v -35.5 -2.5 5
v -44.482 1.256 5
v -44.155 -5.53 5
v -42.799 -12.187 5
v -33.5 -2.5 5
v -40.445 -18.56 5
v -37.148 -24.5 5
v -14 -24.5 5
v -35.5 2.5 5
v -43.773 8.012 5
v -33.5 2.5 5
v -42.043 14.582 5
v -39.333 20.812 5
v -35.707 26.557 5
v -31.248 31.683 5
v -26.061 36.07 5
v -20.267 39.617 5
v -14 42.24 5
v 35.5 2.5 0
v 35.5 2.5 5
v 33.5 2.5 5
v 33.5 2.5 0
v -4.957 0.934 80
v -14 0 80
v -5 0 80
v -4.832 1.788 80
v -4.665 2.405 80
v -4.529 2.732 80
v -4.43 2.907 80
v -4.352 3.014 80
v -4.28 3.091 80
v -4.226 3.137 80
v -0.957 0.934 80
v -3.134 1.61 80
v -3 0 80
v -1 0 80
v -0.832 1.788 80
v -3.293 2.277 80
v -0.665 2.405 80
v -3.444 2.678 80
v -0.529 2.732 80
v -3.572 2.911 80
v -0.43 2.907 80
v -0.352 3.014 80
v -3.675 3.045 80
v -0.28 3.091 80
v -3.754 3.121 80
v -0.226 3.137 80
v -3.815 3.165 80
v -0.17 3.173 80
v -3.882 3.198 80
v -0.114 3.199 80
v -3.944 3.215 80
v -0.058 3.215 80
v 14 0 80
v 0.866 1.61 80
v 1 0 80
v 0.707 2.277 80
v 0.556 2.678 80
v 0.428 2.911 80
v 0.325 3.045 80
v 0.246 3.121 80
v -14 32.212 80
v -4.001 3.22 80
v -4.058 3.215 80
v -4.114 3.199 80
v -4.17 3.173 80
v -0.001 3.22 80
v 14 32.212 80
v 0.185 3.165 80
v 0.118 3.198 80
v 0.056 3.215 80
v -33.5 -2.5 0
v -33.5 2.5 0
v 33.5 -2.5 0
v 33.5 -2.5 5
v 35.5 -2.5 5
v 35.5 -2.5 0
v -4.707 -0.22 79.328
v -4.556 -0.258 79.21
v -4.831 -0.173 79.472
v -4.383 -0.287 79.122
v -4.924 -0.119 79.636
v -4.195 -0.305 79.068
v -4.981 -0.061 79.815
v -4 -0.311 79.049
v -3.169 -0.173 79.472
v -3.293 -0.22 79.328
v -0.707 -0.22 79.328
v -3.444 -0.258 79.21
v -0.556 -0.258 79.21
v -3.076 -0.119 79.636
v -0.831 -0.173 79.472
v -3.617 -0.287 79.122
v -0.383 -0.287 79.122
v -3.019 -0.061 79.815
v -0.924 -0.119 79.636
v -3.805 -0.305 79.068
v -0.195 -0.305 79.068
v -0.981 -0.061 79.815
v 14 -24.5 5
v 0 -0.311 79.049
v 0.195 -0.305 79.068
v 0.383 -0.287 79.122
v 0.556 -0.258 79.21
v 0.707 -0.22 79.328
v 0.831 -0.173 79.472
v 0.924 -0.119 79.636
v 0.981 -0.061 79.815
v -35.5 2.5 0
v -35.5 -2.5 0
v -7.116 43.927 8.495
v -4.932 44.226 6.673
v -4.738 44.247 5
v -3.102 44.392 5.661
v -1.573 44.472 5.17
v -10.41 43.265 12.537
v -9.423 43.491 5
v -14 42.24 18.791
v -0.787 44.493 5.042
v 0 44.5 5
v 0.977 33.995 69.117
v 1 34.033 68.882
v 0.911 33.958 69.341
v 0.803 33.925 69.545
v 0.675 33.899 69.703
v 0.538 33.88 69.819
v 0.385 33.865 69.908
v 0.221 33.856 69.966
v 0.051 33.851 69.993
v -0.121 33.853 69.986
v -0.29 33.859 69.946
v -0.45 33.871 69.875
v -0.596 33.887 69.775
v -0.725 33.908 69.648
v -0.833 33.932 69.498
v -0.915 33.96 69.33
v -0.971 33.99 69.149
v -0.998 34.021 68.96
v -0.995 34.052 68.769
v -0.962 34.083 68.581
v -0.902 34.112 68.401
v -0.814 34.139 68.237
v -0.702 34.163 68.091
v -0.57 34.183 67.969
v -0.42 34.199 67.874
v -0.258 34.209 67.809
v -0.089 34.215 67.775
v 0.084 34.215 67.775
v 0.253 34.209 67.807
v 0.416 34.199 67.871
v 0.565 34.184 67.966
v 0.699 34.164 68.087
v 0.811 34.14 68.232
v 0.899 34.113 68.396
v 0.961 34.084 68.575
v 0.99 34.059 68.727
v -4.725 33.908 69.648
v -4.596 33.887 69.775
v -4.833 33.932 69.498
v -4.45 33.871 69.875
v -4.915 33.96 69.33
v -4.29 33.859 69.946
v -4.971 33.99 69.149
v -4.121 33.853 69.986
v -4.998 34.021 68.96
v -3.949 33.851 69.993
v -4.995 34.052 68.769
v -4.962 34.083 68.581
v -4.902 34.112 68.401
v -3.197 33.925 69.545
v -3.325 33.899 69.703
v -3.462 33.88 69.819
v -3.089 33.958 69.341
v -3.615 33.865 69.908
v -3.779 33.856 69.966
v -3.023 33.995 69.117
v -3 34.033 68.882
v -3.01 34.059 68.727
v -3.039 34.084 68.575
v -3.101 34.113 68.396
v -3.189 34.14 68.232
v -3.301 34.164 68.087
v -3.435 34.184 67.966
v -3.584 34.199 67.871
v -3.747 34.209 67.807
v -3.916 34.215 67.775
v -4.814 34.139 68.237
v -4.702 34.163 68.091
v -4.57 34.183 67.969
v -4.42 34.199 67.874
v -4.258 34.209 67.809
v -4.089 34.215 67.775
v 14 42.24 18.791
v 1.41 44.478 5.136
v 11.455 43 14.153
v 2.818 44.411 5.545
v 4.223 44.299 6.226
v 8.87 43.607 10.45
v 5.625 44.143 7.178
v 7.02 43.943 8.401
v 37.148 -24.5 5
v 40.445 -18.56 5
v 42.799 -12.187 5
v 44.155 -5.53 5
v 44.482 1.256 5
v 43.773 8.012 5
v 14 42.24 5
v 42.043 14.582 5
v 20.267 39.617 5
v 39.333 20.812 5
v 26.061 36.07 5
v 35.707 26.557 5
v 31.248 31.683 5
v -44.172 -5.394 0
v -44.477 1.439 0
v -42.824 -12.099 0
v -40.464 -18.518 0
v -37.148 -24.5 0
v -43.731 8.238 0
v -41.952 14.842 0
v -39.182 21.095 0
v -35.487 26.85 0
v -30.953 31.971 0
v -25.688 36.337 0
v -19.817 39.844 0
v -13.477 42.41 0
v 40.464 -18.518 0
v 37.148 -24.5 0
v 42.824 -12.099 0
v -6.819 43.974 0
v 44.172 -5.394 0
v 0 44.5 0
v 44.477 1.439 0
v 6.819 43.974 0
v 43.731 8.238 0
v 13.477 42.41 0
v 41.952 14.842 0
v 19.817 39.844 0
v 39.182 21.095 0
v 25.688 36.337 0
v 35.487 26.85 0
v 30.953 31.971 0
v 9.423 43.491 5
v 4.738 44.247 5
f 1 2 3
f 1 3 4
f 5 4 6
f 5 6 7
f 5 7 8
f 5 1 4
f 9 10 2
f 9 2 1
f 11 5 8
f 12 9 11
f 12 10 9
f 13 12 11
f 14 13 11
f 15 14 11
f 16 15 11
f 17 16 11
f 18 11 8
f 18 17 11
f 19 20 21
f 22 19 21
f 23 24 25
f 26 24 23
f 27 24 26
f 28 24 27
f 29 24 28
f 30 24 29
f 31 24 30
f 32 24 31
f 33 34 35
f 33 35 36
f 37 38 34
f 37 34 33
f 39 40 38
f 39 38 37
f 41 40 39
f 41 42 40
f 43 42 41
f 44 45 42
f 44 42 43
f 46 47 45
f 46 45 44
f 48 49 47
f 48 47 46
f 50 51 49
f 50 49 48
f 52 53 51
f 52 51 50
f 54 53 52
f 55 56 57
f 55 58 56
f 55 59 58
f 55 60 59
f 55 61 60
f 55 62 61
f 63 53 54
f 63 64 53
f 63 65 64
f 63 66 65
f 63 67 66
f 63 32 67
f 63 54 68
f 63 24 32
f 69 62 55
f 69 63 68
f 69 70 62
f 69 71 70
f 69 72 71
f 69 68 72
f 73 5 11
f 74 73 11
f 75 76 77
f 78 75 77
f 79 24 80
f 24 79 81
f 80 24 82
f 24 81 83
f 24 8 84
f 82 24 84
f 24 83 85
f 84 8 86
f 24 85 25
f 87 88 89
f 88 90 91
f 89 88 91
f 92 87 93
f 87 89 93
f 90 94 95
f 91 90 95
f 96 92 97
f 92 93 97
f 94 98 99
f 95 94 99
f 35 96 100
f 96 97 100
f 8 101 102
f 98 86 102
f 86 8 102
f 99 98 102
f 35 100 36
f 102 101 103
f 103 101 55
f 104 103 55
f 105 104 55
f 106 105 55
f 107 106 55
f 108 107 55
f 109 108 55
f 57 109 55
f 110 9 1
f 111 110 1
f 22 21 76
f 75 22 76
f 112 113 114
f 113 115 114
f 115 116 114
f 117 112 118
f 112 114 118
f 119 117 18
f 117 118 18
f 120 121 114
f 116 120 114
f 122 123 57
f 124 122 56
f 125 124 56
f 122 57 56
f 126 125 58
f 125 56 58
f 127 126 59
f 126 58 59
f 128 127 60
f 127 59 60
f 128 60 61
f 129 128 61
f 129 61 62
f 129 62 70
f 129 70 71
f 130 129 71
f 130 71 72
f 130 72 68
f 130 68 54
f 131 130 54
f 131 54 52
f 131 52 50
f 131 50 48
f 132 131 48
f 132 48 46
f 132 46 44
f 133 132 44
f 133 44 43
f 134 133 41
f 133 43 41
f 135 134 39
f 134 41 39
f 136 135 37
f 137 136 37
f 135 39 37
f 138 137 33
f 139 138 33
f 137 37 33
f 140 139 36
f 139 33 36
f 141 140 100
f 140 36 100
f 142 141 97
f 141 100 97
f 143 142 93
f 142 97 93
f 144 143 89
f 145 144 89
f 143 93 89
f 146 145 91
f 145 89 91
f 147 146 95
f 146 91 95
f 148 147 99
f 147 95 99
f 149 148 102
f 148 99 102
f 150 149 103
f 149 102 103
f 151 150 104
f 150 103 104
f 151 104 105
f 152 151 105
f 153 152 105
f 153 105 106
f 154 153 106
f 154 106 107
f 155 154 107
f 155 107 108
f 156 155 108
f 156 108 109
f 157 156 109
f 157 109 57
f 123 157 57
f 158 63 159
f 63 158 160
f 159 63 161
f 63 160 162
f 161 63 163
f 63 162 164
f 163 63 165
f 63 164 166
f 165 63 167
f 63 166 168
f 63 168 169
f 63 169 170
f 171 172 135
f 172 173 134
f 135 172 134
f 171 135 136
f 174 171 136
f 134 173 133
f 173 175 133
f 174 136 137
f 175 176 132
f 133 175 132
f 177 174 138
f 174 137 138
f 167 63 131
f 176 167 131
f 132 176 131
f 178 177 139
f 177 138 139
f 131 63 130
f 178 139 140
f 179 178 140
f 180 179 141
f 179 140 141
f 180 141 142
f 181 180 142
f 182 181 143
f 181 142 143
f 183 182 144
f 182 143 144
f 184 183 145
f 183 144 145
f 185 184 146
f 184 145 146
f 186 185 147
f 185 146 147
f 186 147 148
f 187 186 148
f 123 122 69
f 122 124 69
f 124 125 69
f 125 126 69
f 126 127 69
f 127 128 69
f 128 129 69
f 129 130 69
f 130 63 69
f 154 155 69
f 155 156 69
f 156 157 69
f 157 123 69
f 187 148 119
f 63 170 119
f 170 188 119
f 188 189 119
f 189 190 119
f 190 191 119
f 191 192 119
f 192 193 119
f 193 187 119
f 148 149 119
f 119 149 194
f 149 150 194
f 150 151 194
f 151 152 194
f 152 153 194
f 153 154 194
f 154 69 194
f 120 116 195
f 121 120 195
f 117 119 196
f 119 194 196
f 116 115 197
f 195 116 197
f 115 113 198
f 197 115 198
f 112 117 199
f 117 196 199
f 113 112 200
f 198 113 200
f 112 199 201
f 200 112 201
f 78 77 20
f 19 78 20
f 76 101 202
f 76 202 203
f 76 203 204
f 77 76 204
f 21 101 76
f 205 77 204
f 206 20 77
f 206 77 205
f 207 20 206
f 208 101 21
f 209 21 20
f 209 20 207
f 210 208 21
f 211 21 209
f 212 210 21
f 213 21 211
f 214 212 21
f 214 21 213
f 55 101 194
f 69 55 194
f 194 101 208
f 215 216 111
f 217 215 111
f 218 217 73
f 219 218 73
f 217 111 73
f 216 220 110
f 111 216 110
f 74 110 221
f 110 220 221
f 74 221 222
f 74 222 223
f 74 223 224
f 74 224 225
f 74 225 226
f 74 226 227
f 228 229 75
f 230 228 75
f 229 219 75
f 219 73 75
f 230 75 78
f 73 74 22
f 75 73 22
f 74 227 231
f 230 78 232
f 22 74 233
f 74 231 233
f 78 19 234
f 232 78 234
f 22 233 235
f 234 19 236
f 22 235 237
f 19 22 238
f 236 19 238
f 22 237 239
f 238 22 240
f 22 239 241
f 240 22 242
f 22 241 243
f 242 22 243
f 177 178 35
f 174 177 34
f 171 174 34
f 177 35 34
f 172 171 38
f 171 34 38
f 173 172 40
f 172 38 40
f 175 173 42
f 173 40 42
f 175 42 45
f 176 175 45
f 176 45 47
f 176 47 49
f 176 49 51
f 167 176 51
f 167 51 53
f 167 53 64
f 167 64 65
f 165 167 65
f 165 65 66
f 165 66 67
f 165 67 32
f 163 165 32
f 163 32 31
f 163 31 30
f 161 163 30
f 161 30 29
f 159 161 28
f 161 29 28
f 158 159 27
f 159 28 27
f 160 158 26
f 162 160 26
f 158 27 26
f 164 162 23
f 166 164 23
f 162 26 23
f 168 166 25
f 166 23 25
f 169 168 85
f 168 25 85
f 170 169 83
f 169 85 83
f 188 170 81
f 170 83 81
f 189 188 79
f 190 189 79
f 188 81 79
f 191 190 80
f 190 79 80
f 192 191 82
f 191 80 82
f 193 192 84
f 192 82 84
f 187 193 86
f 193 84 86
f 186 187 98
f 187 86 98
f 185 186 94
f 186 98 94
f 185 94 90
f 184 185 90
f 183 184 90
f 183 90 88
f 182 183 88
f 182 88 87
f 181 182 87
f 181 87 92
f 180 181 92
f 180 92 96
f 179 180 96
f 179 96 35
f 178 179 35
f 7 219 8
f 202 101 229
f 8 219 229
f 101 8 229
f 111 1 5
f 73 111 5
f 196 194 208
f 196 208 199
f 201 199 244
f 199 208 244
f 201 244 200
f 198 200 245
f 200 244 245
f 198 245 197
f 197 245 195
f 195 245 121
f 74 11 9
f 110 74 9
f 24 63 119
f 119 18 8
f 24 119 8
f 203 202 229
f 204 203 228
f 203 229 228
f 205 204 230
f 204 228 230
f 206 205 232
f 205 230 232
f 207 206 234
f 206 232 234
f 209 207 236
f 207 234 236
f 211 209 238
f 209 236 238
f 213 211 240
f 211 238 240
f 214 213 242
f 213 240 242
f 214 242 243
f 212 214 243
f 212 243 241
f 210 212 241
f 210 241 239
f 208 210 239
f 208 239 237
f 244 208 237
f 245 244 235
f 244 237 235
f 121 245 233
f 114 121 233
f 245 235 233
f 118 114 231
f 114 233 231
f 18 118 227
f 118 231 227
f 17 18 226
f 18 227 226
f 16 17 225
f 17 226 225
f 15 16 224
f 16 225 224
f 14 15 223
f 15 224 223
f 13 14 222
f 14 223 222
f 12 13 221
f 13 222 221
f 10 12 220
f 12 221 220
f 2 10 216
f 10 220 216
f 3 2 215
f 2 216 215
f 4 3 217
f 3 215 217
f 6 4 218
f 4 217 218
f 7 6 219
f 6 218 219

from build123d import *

# Parameters (mm, degrees)
F1_DEPTH = 5
F3_DEPTH = 75
F5_DEPTH = 58.501
F7_DEPTH = 5.001
F8_R     = 1
F9_DEPTH = 67.142736129


with BuildPart() as f1:
    # F0 (on Top) → F1 (new body)
    with BuildSketch(Plane.XY):
        with BuildLine():
            ThreePointArc((37.148351242, -24.5), (0, 44.5), (-37.148351242, -24.5))
            Line((-37.148351242, -24.5), (37.148351242, -24.5))
        make_face()
    extrude(amount=F1_DEPTH)

    # F2 (on face) → F3 (join)
    with BuildSketch(Plane.XY.offset(5)):
        with BuildLine():
            Line((-14, -24.5), (0, -24.5))
            Line((0, -24.5), (14, -24.5))
            Line((14, -24.5), (14, 42.240383521))
            ThreePointArc((14, 42.240383521), (0, 44.5), (-14, 42.240383521))
            Line((-14, 42.240383521), (-14, -24.5))
        make_face()
    extrude(amount=F3_DEPTH)

    # F4 (on face) → F5 (cut, through all)
    with BuildSketch(Plane.YZ.offset(14)):
        Polygon((-24.5, 5), (0, 80), (0, 88), (-35, 88), (-35, 5), align=None)
        Polygon((57.2117942726, 88), (32.2117942726, 88), (32.2117942726, 80), (44.5, 5), (57.2117942726, 5), align=None)
    extrude(amount=-F5_DEPTH, mode=Mode.SUBTRACT)

    # F6 (on face) → F7 (cut, through all)
    with BuildSketch(Plane.XY.offset(5)):
        Polygon((-33.5, -2.5), (-33.5, 0), (-33.5, 2.5), (-35.5, 2.5), (-35.5, -2.5), align=None)
        Polygon((35.5, 2.5), (33.5, 2.5), (33.5, 0), (33.5, -2.5), (35.5, -2.5), align=None)
    extrude(amount=-F7_DEPTH, mode=Mode.SUBTRACT)

    # F8 (on face) → F9 (cut, through all)
    with BuildSketch(Plane(origin=(0, -23.6135094976, 7.7137464359), x_dir=(1, 0, 0), z_dir=(0, -0.9505672883, 0.3105186475))):
        with Locations((0, 76.0453830625)):
            Circle(F8_R)
        with Locations((-4, 76.0453830625)):
            Circle(F8_R)
    extrude(amount=-F9_DEPTH, mode=Mode.SUBTRACT)


solid = f1.part
